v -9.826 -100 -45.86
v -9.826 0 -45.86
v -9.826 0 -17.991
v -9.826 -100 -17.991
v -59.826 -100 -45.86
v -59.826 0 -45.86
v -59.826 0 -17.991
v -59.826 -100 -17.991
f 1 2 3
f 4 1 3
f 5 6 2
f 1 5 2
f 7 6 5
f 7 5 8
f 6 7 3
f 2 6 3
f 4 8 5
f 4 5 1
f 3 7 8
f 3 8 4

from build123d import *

# Parameters (mm, degrees)
F1_DEPTH = 100
F0_R     = 15.3620181697
F0_W     = 50
F0_H     = 27.8688543963


with BuildPart() as f1:
    # F0 (on Front) → F1 (new body)
    with BuildSketch(Plane.XZ):
        Polygon((-50.8095297794, 0), (-29.4980568604, 0), (0, 29.5502637848), (0, 52.0912465749), align=None)
    extrude(amount=F1_DEPTH)


with BuildPart() as f1b:
    # F0 (on Front) → F1, piece 2 (new body)
    with BuildSketch(Plane.XZ):
        with Locations((29.9281747926, 34.0584610181)):
            Circle(F0_R)
    extrude(amount=F1_DEPTH)


with BuildPart() as f1c:
    # F0 (on Front) → F1, piece 3 (new body)
    with BuildSketch(Plane.XZ):
        with Locations((-34.8259250902, -31.9251453594)):
            Rectangle(F0_W, F0_H)
    extrude(amount=F1_DEPTH)


solid = f1c.part
